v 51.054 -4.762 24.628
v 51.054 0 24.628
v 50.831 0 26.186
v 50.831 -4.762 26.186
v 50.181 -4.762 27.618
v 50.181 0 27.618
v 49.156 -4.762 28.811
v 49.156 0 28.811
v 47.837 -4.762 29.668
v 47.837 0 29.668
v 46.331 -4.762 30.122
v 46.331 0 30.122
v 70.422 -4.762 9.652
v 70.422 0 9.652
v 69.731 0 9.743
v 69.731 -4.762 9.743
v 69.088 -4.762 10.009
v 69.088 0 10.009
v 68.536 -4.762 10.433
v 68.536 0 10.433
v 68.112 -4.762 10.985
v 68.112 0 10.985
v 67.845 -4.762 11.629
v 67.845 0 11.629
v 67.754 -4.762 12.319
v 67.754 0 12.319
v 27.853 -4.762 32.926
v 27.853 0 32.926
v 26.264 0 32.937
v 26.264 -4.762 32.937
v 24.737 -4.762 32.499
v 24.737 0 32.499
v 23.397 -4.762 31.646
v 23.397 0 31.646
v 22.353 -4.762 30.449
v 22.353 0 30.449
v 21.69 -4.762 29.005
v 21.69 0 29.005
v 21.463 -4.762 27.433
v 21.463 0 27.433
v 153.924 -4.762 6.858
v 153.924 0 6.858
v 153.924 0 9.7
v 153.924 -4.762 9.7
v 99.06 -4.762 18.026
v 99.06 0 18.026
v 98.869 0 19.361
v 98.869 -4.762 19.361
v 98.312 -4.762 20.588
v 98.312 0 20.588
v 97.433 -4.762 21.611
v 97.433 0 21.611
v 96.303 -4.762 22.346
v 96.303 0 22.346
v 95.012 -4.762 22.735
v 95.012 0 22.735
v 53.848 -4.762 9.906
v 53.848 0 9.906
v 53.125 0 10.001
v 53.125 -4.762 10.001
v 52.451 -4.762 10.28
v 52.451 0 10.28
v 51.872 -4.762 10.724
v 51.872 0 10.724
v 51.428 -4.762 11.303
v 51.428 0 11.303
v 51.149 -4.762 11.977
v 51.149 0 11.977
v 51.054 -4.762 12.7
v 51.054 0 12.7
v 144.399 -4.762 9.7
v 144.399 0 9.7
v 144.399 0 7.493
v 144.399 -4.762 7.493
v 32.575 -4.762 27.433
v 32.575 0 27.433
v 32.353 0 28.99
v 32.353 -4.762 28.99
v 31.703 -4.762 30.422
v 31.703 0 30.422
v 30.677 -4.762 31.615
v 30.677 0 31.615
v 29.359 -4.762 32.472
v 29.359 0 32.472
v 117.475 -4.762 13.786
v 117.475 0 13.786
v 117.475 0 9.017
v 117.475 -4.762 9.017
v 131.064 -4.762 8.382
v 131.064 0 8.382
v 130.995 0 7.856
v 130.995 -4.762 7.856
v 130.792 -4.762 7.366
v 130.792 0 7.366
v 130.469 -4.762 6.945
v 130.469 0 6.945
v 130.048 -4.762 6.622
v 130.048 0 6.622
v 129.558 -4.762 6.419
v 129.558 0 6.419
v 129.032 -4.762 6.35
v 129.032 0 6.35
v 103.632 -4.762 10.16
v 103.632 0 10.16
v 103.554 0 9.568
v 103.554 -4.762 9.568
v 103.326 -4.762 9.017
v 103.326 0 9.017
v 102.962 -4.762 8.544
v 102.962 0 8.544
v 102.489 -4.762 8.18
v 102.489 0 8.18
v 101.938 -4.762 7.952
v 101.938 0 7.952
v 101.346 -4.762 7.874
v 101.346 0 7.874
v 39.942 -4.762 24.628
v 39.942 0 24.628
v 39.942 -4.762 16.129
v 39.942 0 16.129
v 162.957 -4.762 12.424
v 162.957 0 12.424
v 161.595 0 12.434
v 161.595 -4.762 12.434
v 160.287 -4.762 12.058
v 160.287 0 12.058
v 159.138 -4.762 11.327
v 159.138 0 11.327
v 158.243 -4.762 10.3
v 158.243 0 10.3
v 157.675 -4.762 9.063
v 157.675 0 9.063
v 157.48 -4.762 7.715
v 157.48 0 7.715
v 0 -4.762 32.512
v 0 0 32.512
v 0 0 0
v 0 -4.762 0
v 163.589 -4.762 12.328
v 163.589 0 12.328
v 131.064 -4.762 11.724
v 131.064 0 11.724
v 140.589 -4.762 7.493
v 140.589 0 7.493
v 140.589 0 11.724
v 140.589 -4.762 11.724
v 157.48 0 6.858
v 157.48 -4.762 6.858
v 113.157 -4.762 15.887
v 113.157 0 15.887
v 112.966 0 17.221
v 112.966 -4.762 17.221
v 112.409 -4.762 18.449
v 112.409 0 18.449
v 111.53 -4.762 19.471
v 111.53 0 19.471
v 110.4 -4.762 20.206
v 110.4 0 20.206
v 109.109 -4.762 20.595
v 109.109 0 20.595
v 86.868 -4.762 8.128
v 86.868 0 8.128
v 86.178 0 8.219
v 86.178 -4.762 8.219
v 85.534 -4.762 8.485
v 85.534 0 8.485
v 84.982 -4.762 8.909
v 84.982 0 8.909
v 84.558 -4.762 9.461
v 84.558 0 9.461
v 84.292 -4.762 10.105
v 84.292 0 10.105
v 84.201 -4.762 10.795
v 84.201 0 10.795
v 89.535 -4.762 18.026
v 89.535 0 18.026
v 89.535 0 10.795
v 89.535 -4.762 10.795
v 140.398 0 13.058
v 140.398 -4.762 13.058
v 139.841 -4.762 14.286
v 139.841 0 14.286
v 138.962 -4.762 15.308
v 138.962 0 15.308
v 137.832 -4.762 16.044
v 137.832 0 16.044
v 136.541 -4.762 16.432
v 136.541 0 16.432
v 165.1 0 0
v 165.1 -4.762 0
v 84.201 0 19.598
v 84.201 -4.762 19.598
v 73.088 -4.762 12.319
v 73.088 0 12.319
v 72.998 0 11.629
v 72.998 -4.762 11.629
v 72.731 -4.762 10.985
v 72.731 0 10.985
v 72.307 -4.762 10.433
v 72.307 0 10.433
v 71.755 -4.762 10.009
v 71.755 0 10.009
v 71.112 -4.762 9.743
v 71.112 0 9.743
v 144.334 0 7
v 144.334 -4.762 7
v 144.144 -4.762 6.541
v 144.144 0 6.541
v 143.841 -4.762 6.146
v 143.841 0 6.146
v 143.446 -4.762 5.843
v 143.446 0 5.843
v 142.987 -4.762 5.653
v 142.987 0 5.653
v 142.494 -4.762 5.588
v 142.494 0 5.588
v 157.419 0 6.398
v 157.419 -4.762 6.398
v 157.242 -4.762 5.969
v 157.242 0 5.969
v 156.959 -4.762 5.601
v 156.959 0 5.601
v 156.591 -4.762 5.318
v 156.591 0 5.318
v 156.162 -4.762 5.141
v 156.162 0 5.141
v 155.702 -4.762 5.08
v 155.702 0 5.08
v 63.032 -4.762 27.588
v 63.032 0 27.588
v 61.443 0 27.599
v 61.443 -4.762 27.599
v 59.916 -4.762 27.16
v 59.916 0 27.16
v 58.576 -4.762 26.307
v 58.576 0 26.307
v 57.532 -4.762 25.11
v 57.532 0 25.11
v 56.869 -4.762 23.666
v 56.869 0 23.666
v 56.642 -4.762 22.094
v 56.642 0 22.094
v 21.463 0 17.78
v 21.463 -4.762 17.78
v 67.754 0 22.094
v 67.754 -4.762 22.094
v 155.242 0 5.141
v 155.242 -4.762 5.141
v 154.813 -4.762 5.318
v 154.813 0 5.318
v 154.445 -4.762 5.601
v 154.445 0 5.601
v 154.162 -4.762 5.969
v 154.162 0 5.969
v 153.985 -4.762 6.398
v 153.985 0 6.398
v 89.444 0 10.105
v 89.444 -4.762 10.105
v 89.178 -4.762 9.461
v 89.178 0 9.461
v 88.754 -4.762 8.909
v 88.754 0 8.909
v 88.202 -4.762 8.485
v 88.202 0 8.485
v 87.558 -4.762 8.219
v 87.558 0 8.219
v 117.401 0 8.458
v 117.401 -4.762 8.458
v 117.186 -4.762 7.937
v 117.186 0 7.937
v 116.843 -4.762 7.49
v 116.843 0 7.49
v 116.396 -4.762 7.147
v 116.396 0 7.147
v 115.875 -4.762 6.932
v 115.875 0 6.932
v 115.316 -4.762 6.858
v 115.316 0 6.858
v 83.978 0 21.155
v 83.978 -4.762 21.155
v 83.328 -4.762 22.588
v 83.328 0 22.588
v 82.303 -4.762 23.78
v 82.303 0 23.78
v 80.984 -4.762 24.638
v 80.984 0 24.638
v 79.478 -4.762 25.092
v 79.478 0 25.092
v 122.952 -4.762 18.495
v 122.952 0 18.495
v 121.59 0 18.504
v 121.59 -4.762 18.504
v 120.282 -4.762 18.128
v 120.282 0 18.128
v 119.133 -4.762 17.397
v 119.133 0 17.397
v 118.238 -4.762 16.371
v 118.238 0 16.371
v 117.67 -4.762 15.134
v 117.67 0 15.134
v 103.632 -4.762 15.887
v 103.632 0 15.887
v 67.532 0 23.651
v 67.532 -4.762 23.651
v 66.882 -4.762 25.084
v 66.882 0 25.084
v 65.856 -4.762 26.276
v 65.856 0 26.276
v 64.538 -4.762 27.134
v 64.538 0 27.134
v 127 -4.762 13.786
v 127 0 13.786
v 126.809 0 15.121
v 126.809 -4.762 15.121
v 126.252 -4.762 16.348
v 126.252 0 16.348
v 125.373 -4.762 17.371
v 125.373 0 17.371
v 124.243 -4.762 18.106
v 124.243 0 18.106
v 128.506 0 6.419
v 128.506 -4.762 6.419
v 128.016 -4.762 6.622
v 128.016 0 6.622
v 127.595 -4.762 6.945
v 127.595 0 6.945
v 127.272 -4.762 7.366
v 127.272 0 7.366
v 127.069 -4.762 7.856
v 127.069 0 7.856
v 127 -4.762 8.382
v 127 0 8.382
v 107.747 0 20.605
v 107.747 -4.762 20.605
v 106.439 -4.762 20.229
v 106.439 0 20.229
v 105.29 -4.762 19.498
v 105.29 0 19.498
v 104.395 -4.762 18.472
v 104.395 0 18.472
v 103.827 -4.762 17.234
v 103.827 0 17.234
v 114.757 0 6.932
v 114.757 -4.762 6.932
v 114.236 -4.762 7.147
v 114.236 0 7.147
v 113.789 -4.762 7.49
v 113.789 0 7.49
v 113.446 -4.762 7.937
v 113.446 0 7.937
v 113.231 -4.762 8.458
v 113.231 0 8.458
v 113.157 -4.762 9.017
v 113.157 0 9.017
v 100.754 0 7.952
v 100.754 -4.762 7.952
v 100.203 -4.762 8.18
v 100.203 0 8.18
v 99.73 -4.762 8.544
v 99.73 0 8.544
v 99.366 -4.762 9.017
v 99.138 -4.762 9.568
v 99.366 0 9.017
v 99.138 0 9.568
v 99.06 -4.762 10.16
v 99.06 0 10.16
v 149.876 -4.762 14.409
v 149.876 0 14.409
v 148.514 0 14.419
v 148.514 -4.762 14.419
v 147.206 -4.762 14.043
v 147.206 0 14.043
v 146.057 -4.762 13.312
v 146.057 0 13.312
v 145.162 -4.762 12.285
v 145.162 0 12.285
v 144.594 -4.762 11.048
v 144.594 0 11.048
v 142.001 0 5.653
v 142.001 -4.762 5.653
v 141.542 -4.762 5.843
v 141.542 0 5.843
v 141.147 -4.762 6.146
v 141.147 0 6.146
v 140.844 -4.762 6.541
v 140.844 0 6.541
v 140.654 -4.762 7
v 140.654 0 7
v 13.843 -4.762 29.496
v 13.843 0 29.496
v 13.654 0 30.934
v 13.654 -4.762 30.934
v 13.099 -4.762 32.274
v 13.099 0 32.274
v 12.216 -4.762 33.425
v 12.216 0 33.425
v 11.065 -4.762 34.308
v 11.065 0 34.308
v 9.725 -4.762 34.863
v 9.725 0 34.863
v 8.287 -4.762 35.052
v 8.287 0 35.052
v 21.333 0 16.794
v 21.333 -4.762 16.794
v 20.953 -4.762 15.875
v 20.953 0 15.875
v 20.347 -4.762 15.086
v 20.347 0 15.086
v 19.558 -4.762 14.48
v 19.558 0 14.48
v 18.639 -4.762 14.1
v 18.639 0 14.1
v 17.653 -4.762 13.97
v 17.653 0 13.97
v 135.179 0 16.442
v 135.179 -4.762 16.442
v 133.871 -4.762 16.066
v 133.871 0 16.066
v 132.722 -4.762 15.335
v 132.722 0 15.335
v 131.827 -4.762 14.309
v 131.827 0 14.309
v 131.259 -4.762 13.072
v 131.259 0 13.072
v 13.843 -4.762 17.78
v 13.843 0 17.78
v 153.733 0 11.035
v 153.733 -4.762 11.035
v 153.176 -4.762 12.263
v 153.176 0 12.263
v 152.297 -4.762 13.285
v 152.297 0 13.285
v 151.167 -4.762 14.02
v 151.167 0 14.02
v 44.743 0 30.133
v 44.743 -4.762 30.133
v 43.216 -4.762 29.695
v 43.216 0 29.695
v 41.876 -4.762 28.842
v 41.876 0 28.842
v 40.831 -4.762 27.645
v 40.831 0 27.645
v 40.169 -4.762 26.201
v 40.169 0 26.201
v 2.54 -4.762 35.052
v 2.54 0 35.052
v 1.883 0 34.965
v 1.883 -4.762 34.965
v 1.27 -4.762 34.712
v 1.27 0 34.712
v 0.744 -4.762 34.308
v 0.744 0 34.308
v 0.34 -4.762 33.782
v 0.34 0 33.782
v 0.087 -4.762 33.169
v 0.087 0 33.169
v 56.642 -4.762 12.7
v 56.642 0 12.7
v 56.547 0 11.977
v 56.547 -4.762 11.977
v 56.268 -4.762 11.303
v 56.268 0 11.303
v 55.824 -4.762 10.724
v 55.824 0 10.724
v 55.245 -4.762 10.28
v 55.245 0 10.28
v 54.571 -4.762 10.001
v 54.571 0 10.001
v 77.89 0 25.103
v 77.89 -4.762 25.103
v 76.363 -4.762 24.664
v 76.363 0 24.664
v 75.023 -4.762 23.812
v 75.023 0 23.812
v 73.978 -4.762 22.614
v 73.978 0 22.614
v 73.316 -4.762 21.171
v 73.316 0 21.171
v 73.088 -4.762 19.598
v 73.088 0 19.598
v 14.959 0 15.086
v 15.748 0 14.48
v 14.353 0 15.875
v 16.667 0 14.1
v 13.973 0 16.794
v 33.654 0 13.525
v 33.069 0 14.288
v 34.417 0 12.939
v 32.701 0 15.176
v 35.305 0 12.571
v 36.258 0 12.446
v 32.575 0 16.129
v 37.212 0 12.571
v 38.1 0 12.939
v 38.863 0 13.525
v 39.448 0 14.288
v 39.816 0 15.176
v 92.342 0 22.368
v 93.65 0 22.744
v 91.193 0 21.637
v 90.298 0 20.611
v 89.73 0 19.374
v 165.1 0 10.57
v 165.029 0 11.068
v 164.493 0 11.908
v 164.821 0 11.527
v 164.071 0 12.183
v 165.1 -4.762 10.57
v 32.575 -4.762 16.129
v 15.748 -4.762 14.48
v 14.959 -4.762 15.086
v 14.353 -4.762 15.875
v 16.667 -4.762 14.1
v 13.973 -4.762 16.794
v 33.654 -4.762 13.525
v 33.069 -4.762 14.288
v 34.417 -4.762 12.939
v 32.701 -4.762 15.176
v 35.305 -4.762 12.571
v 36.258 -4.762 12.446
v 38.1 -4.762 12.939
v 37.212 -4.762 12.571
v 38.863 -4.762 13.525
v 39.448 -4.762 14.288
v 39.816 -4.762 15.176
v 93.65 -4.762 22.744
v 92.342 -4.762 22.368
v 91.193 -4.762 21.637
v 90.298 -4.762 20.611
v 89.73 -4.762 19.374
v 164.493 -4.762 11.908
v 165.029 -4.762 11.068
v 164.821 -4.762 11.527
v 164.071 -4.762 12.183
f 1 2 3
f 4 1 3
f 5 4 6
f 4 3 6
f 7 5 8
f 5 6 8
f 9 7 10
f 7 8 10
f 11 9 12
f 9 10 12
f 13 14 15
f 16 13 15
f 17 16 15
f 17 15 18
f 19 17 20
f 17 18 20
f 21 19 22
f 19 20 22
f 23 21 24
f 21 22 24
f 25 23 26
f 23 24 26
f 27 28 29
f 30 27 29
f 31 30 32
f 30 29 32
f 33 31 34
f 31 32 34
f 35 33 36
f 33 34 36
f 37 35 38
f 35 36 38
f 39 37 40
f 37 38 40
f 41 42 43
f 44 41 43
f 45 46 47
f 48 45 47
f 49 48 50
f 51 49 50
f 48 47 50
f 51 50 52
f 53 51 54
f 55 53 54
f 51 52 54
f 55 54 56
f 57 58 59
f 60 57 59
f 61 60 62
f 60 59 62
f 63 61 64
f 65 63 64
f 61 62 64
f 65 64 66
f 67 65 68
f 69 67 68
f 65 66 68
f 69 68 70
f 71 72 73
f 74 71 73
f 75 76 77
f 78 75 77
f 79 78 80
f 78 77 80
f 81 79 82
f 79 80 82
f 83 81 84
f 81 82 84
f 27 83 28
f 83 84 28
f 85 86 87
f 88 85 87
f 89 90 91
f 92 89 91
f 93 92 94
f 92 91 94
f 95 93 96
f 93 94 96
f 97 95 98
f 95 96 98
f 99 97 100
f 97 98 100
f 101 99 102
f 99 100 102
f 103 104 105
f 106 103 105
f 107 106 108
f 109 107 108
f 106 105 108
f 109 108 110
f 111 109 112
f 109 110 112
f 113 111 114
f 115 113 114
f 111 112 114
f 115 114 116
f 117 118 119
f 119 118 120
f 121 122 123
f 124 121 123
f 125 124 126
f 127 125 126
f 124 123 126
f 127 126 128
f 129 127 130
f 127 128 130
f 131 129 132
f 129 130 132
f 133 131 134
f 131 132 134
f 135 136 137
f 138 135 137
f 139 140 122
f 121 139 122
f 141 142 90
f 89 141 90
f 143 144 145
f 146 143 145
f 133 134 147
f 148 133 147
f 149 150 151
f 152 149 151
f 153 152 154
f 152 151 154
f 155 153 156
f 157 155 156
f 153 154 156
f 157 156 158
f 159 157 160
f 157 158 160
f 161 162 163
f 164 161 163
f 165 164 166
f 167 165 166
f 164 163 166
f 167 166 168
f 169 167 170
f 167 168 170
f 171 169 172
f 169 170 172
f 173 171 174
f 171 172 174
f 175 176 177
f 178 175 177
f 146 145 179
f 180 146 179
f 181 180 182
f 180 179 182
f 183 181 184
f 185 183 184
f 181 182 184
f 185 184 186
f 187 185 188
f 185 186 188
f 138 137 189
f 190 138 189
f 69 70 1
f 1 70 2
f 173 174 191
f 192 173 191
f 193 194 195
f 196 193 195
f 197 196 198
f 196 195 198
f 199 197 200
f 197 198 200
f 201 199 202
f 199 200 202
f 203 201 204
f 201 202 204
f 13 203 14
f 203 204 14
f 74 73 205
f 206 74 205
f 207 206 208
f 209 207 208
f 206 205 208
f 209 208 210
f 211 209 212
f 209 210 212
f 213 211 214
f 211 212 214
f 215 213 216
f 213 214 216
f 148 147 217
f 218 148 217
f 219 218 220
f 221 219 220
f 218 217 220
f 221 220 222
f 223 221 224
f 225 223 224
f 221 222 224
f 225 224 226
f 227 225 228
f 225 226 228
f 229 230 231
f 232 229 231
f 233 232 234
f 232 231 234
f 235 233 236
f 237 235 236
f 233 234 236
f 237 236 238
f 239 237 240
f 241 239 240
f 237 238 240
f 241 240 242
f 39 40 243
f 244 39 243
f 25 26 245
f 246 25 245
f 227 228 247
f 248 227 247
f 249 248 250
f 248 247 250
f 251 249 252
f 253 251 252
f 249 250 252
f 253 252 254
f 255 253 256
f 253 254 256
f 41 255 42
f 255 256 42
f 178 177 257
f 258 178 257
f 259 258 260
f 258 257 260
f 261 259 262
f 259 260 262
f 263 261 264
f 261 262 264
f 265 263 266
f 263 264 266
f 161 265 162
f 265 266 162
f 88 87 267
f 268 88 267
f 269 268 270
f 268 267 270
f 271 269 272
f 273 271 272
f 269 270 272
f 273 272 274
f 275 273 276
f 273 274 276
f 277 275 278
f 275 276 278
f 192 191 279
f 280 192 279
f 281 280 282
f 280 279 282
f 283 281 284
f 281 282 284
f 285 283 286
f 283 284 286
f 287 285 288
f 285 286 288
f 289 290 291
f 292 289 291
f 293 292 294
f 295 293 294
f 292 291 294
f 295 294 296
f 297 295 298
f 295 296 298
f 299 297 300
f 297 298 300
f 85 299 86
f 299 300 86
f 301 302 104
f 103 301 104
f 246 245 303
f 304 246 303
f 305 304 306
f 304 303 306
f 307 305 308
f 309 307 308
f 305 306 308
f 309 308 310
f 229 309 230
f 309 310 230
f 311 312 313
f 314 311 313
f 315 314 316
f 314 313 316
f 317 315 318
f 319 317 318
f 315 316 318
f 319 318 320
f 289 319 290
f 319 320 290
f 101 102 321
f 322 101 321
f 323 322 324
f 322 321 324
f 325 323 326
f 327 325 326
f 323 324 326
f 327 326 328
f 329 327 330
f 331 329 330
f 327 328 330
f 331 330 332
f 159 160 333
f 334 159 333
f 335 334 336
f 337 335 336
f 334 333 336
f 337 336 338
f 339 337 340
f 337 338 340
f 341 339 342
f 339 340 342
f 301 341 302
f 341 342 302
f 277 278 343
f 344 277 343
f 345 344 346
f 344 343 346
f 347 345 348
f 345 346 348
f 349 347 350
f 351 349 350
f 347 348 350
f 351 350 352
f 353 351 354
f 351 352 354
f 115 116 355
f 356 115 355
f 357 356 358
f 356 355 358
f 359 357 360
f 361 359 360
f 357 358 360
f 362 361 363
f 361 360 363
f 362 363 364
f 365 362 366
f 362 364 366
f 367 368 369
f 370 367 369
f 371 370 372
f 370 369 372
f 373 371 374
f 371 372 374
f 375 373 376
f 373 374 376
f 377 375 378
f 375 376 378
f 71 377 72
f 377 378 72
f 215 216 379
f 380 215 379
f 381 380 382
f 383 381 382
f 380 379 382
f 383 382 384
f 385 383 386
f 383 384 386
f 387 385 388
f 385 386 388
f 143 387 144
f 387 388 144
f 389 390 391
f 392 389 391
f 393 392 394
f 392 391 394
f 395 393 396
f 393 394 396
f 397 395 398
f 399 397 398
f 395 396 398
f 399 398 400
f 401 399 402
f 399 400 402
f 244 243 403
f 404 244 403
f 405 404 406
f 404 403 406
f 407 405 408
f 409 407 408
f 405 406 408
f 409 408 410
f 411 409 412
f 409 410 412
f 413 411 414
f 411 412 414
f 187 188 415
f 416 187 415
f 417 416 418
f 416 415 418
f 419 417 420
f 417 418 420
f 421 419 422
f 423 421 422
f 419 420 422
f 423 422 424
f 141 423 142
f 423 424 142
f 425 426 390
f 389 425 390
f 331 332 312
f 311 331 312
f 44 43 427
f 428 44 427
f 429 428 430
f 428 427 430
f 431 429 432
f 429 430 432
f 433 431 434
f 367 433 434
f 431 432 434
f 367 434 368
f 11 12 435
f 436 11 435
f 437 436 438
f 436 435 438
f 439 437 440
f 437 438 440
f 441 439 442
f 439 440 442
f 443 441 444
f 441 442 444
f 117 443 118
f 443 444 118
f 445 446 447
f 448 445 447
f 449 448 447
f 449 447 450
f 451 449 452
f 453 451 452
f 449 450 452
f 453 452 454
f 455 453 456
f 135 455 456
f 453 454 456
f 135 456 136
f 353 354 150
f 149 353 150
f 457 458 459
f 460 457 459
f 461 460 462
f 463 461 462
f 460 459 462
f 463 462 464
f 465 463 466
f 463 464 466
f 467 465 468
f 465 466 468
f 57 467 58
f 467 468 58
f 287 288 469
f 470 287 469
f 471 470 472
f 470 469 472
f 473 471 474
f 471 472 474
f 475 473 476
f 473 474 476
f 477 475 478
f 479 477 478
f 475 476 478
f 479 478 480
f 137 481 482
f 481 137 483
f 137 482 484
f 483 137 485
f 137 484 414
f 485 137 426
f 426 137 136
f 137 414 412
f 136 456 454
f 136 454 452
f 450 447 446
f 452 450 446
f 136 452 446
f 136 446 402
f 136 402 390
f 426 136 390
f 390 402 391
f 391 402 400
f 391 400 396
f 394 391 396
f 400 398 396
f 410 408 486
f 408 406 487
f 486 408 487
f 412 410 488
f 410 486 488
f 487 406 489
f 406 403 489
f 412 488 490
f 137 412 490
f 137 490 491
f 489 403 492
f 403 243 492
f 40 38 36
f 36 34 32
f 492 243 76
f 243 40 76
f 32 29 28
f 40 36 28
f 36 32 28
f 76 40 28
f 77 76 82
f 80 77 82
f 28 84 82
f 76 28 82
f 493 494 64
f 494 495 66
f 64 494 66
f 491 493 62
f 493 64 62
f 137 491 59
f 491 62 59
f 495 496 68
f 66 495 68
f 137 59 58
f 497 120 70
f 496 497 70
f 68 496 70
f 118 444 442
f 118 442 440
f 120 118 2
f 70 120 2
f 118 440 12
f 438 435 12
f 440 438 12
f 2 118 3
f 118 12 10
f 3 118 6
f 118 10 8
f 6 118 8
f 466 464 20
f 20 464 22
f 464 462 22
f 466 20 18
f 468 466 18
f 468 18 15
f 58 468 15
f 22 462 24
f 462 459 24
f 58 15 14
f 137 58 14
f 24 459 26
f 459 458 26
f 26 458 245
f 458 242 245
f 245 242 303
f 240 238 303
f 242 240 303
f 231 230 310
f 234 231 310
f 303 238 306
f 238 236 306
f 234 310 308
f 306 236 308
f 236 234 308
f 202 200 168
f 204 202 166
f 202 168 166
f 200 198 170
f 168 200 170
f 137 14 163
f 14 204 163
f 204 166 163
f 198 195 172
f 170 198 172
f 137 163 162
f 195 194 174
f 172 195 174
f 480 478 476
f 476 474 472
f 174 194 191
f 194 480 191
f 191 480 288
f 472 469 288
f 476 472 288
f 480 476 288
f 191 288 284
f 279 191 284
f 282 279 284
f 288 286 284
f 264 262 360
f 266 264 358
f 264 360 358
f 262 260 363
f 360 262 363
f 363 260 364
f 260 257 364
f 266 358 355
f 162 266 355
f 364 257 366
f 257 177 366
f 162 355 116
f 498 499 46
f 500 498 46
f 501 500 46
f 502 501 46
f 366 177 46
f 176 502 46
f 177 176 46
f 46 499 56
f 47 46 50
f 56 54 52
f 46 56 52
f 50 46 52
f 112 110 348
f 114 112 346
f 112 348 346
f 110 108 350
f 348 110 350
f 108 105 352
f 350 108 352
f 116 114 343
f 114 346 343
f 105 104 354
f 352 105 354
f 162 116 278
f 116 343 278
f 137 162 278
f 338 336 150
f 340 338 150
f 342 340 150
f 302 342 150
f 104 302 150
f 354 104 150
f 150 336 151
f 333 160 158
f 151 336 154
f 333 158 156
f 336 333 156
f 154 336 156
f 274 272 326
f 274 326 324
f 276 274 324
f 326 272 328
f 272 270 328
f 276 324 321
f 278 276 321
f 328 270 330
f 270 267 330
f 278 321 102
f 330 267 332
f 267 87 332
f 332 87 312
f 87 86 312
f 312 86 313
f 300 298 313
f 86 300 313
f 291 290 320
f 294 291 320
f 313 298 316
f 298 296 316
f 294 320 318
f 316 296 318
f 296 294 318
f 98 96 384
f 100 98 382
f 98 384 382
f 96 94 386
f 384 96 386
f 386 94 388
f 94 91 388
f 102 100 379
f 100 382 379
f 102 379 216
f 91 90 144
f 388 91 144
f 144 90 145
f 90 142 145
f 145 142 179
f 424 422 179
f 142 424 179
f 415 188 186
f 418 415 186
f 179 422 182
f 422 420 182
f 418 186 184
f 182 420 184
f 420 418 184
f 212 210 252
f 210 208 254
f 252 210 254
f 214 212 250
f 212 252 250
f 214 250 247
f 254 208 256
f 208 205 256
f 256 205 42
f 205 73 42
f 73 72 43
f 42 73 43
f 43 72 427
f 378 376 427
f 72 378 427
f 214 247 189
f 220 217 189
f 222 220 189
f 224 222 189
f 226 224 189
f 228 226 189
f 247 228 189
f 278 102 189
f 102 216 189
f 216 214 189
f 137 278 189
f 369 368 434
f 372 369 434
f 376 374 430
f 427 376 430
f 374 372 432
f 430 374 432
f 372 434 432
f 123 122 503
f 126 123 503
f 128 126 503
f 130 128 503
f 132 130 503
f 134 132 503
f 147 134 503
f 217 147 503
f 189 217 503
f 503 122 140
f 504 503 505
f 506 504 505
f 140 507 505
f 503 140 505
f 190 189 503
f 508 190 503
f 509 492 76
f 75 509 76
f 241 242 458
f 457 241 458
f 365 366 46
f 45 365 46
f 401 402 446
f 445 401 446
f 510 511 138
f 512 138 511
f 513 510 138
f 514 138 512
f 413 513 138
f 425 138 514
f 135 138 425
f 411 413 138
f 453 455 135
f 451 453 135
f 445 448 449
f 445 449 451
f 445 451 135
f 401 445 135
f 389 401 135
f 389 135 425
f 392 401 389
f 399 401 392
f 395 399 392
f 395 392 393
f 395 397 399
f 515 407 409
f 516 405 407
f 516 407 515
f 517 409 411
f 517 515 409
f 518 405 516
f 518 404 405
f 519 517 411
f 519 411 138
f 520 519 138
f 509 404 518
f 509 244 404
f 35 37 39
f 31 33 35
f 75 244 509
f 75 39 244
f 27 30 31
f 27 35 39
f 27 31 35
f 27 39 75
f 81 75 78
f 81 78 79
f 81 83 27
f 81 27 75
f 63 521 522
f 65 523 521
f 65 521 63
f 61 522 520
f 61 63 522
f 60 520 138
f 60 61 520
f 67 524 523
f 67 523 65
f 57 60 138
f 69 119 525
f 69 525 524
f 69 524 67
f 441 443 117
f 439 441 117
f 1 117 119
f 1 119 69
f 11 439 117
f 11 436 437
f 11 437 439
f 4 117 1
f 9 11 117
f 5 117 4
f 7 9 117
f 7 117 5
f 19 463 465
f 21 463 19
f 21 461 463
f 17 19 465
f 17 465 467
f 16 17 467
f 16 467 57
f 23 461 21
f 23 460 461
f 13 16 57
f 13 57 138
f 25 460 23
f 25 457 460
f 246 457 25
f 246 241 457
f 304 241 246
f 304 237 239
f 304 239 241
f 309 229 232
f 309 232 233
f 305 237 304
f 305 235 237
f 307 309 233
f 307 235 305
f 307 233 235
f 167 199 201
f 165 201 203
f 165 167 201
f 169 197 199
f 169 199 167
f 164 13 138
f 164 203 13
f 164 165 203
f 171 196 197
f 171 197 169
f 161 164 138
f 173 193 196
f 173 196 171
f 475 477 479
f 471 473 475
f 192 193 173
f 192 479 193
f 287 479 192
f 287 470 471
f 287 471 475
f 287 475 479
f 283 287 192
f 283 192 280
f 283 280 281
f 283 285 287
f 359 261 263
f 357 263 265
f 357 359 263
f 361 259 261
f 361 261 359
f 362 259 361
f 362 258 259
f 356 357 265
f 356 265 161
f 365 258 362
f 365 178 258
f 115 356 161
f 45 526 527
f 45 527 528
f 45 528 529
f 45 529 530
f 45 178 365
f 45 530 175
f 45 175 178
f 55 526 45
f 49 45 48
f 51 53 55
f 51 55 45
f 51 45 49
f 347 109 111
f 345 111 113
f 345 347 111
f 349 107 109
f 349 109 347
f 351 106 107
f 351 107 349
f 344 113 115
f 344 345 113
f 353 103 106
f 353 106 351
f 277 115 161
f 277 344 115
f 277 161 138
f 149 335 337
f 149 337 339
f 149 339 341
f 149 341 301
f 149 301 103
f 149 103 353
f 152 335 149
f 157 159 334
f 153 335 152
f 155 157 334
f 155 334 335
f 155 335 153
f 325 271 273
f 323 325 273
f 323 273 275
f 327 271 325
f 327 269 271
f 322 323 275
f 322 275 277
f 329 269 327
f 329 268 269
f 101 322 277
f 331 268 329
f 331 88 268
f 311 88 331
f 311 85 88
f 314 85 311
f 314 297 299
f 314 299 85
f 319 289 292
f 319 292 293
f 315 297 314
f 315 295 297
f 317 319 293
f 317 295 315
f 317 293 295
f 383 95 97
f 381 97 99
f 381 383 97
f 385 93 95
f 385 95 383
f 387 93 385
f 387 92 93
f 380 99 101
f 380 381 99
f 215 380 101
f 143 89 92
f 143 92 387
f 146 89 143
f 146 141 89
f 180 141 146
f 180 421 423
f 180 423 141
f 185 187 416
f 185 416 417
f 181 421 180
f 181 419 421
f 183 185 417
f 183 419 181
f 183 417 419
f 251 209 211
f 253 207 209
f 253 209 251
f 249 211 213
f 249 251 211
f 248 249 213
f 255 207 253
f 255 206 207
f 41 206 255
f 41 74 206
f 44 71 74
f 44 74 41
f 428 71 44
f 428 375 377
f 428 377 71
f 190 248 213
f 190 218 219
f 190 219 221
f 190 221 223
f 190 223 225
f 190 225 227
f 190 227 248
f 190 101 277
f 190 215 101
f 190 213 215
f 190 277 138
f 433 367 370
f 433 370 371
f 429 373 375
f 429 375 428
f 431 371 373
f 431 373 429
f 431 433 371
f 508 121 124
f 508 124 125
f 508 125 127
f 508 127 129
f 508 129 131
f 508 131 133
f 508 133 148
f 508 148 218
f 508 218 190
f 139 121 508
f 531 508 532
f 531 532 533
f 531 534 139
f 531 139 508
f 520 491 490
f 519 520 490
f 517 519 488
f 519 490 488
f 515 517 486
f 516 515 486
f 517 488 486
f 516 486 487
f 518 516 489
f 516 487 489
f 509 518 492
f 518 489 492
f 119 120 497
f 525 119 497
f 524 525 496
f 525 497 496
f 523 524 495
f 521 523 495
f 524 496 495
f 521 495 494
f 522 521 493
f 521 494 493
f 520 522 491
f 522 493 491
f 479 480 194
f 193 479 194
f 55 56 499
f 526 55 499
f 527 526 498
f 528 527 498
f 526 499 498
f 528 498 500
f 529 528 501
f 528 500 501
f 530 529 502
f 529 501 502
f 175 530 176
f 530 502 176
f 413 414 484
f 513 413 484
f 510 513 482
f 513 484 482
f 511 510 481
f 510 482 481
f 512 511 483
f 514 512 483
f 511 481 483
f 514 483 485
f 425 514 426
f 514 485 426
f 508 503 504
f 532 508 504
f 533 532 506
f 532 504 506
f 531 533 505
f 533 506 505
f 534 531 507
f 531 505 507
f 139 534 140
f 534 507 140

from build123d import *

# Parameters (mm, degrees)
F1_DEPTH = 4.7625


with BuildPart() as f1:
    # F0 (on Front) → F1 (new body)
    with BuildSketch(Plane.XZ):
        with BuildLine():
            Line((0, 32.512), (0, 0))
            Line((0, 0), (165.1, 0))
            Line((165.1, 0), (165.1, 10.570061))
            ThreePointArc((165.1, 10.570061), (164.670255, 11.729152), (163.588759, 12.327935))
            Line((163.588759, 12.327935), (162.957034, 12.4238))
            ThreePointArc((162.957034, 12.4238), (159.137791, 11.326604), (157.48, 7.715207))
            Line((157.48, 7.715207), (157.48, 6.858))
            ThreePointArc((157.48, 6.858), (156.959236, 5.600764), (155.702, 5.08))
            ThreePointArc((155.702, 5.08), (154.444764, 5.600764), (153.924, 6.858))
            Line((153.924, 6.858), (153.924, 9.700262))
            ThreePointArc((153.924, 9.700262), (152.772897, 12.804971), (149.876034, 14.408855))
            ThreePointArc((149.876034, 14.408855), (146.056791, 13.311659), (144.399, 9.700262))
            Line((144.399, 9.700262), (144.399, 7.493))
            ThreePointArc((144.399, 7.493), (143.841038, 6.145962), (142.494, 5.588))
            ThreePointArc((142.494, 5.588), (141.146962, 6.145962), (140.589, 7.493))
            Line((140.589, 7.493), (140.589, 11.723861))
            ThreePointArc((140.589, 11.723861), (139.437897, 14.82857), (136.541034, 16.432454))
            ThreePointArc((136.541034, 16.432454), (132.721791, 15.335258), (131.064, 11.723861))
            Line((131.064, 11.723861), (131.064, 8.382))
            ThreePointArc((131.064, 8.382), (130.468841, 6.945159), (129.032, 6.35))
            ThreePointArc((129.032, 6.35), (127.595159, 6.945159), (127, 8.382))
            Line((127, 8.382), (127, 13.786005))
            ThreePointArc((127, 13.786005), (125.848897, 16.890714), (122.952034, 18.494598))
            ThreePointArc((122.952034, 18.494598), (119.132791, 17.397402), (117.475, 13.786005))
            Line((117.475, 13.786005), (117.475, 9.017))
            ThreePointArc((117.475, 9.017), (116.842644, 7.490356), (115.316, 6.858))
            ThreePointArc((115.316, 6.858), (113.789356, 7.490356), (113.157, 9.017))
            Line((113.157, 9.017), (113.157, 15.886694))
            ThreePointArc((113.157, 15.886694), (112.005897, 18.991403), (109.109034, 20.595287))
            ThreePointArc((109.109034, 20.595287), (105.289791, 19.49809), (103.632, 15.886694))
            Line((103.632, 15.886694), (103.632, 10.16))
            ThreePointArc((103.632, 10.16), (102.962446, 8.543554), (101.346, 7.874))
            ThreePointArc((101.346, 7.874), (99.729554, 8.543554), (99.06, 10.16))
            Line((99.06, 10.16), (99.06, 18.025927))
            ThreePointArc((99.06, 18.025927), (97.908897, 21.130637), (95.012034, 22.73452))
            ThreePointArc((95.012034, 22.73452), (91.192791, 21.637324), (89.535, 18.025927))
            Line((89.535, 18.025927), (89.535, 10.795))
            ThreePointArc((89.535, 10.795), (88.753854, 8.909146), (86.868, 8.128))
            ThreePointArc((86.868, 8.128), (84.982146, 8.909146), (84.201, 10.795))
            Line((84.201, 10.795), (84.201, 19.59841))
            ThreePointArc((84.201, 19.59841), (82.858046, 23.220571), (79.478372, 25.091768))
            ThreePointArc((79.478372, 25.091768), (75.022589, 23.811706), (73.0885, 19.59841))
            Line((73.0885, 19.59841), (73.0885, 12.319))
            ThreePointArc((73.0885, 12.319), (72.307354, 10.433146), (70.4215, 9.652))
            ThreePointArc((70.4215, 9.652), (68.535646, 10.433146), (67.7545, 12.319))
            Line((67.7545, 12.319), (67.7545, 22.094182))
            ThreePointArc((67.7545, 22.094182), (66.411546, 25.716343), (63.031872, 27.587541))
            ThreePointArc((63.031872, 27.587541), (58.576089, 26.307478), (56.642, 22.094182))
            Line((56.642, 22.094182), (56.642, 12.7))
            ThreePointArc((56.642, 12.7), (55.823656, 10.724344), (53.848, 9.906))
            ThreePointArc((53.848, 9.906), (51.872344, 10.724344), (51.054, 12.7))
            Line((51.054, 12.7), (51.054, 24.628499))
            ThreePointArc((51.054, 24.628499), (49.711046, 28.25066), (46.331372, 30.121858))
            ThreePointArc((46.331372, 30.121858), (41.875589, 28.841796), (39.9415, 24.628499))
            Line((39.9415, 24.628499), (39.9415, 16.129))
            ThreePointArc((39.9415, 16.129), (38.862774, 13.524726), (36.2585, 12.446))
            ThreePointArc((36.2585, 12.446), (33.654226, 13.524726), (32.5755, 16.129))
            Line((32.5755, 16.129), (32.5755, 27.43263))
            ThreePointArc((32.5755, 27.43263), (31.232546, 31.054791), (27.852872, 32.925988))
            ThreePointArc((27.852872, 32.925988), (23.397089, 31.645926), (21.463, 27.43263))
            Line((21.463, 27.43263), (21.463, 17.78))
            ThreePointArc((21.463, 17.78), (20.347077, 15.085923), (17.653, 13.97))
            ThreePointArc((17.653, 13.97), (14.958923, 15.085923), (13.843, 17.78))
            Line((13.843, 17.78), (13.843, 29.49575))
            ThreePointArc((13.843, 29.49575), (12.215612, 33.424612), (8.28675, 35.052))
            Line((8.28675, 35.052), (2.54, 35.052))
            ThreePointArc((2.54, 35.052), (0.743949, 34.308051), (0, 32.512))
        make_face()
    extrude(amount=F1_DEPTH)


solid = f1.part
